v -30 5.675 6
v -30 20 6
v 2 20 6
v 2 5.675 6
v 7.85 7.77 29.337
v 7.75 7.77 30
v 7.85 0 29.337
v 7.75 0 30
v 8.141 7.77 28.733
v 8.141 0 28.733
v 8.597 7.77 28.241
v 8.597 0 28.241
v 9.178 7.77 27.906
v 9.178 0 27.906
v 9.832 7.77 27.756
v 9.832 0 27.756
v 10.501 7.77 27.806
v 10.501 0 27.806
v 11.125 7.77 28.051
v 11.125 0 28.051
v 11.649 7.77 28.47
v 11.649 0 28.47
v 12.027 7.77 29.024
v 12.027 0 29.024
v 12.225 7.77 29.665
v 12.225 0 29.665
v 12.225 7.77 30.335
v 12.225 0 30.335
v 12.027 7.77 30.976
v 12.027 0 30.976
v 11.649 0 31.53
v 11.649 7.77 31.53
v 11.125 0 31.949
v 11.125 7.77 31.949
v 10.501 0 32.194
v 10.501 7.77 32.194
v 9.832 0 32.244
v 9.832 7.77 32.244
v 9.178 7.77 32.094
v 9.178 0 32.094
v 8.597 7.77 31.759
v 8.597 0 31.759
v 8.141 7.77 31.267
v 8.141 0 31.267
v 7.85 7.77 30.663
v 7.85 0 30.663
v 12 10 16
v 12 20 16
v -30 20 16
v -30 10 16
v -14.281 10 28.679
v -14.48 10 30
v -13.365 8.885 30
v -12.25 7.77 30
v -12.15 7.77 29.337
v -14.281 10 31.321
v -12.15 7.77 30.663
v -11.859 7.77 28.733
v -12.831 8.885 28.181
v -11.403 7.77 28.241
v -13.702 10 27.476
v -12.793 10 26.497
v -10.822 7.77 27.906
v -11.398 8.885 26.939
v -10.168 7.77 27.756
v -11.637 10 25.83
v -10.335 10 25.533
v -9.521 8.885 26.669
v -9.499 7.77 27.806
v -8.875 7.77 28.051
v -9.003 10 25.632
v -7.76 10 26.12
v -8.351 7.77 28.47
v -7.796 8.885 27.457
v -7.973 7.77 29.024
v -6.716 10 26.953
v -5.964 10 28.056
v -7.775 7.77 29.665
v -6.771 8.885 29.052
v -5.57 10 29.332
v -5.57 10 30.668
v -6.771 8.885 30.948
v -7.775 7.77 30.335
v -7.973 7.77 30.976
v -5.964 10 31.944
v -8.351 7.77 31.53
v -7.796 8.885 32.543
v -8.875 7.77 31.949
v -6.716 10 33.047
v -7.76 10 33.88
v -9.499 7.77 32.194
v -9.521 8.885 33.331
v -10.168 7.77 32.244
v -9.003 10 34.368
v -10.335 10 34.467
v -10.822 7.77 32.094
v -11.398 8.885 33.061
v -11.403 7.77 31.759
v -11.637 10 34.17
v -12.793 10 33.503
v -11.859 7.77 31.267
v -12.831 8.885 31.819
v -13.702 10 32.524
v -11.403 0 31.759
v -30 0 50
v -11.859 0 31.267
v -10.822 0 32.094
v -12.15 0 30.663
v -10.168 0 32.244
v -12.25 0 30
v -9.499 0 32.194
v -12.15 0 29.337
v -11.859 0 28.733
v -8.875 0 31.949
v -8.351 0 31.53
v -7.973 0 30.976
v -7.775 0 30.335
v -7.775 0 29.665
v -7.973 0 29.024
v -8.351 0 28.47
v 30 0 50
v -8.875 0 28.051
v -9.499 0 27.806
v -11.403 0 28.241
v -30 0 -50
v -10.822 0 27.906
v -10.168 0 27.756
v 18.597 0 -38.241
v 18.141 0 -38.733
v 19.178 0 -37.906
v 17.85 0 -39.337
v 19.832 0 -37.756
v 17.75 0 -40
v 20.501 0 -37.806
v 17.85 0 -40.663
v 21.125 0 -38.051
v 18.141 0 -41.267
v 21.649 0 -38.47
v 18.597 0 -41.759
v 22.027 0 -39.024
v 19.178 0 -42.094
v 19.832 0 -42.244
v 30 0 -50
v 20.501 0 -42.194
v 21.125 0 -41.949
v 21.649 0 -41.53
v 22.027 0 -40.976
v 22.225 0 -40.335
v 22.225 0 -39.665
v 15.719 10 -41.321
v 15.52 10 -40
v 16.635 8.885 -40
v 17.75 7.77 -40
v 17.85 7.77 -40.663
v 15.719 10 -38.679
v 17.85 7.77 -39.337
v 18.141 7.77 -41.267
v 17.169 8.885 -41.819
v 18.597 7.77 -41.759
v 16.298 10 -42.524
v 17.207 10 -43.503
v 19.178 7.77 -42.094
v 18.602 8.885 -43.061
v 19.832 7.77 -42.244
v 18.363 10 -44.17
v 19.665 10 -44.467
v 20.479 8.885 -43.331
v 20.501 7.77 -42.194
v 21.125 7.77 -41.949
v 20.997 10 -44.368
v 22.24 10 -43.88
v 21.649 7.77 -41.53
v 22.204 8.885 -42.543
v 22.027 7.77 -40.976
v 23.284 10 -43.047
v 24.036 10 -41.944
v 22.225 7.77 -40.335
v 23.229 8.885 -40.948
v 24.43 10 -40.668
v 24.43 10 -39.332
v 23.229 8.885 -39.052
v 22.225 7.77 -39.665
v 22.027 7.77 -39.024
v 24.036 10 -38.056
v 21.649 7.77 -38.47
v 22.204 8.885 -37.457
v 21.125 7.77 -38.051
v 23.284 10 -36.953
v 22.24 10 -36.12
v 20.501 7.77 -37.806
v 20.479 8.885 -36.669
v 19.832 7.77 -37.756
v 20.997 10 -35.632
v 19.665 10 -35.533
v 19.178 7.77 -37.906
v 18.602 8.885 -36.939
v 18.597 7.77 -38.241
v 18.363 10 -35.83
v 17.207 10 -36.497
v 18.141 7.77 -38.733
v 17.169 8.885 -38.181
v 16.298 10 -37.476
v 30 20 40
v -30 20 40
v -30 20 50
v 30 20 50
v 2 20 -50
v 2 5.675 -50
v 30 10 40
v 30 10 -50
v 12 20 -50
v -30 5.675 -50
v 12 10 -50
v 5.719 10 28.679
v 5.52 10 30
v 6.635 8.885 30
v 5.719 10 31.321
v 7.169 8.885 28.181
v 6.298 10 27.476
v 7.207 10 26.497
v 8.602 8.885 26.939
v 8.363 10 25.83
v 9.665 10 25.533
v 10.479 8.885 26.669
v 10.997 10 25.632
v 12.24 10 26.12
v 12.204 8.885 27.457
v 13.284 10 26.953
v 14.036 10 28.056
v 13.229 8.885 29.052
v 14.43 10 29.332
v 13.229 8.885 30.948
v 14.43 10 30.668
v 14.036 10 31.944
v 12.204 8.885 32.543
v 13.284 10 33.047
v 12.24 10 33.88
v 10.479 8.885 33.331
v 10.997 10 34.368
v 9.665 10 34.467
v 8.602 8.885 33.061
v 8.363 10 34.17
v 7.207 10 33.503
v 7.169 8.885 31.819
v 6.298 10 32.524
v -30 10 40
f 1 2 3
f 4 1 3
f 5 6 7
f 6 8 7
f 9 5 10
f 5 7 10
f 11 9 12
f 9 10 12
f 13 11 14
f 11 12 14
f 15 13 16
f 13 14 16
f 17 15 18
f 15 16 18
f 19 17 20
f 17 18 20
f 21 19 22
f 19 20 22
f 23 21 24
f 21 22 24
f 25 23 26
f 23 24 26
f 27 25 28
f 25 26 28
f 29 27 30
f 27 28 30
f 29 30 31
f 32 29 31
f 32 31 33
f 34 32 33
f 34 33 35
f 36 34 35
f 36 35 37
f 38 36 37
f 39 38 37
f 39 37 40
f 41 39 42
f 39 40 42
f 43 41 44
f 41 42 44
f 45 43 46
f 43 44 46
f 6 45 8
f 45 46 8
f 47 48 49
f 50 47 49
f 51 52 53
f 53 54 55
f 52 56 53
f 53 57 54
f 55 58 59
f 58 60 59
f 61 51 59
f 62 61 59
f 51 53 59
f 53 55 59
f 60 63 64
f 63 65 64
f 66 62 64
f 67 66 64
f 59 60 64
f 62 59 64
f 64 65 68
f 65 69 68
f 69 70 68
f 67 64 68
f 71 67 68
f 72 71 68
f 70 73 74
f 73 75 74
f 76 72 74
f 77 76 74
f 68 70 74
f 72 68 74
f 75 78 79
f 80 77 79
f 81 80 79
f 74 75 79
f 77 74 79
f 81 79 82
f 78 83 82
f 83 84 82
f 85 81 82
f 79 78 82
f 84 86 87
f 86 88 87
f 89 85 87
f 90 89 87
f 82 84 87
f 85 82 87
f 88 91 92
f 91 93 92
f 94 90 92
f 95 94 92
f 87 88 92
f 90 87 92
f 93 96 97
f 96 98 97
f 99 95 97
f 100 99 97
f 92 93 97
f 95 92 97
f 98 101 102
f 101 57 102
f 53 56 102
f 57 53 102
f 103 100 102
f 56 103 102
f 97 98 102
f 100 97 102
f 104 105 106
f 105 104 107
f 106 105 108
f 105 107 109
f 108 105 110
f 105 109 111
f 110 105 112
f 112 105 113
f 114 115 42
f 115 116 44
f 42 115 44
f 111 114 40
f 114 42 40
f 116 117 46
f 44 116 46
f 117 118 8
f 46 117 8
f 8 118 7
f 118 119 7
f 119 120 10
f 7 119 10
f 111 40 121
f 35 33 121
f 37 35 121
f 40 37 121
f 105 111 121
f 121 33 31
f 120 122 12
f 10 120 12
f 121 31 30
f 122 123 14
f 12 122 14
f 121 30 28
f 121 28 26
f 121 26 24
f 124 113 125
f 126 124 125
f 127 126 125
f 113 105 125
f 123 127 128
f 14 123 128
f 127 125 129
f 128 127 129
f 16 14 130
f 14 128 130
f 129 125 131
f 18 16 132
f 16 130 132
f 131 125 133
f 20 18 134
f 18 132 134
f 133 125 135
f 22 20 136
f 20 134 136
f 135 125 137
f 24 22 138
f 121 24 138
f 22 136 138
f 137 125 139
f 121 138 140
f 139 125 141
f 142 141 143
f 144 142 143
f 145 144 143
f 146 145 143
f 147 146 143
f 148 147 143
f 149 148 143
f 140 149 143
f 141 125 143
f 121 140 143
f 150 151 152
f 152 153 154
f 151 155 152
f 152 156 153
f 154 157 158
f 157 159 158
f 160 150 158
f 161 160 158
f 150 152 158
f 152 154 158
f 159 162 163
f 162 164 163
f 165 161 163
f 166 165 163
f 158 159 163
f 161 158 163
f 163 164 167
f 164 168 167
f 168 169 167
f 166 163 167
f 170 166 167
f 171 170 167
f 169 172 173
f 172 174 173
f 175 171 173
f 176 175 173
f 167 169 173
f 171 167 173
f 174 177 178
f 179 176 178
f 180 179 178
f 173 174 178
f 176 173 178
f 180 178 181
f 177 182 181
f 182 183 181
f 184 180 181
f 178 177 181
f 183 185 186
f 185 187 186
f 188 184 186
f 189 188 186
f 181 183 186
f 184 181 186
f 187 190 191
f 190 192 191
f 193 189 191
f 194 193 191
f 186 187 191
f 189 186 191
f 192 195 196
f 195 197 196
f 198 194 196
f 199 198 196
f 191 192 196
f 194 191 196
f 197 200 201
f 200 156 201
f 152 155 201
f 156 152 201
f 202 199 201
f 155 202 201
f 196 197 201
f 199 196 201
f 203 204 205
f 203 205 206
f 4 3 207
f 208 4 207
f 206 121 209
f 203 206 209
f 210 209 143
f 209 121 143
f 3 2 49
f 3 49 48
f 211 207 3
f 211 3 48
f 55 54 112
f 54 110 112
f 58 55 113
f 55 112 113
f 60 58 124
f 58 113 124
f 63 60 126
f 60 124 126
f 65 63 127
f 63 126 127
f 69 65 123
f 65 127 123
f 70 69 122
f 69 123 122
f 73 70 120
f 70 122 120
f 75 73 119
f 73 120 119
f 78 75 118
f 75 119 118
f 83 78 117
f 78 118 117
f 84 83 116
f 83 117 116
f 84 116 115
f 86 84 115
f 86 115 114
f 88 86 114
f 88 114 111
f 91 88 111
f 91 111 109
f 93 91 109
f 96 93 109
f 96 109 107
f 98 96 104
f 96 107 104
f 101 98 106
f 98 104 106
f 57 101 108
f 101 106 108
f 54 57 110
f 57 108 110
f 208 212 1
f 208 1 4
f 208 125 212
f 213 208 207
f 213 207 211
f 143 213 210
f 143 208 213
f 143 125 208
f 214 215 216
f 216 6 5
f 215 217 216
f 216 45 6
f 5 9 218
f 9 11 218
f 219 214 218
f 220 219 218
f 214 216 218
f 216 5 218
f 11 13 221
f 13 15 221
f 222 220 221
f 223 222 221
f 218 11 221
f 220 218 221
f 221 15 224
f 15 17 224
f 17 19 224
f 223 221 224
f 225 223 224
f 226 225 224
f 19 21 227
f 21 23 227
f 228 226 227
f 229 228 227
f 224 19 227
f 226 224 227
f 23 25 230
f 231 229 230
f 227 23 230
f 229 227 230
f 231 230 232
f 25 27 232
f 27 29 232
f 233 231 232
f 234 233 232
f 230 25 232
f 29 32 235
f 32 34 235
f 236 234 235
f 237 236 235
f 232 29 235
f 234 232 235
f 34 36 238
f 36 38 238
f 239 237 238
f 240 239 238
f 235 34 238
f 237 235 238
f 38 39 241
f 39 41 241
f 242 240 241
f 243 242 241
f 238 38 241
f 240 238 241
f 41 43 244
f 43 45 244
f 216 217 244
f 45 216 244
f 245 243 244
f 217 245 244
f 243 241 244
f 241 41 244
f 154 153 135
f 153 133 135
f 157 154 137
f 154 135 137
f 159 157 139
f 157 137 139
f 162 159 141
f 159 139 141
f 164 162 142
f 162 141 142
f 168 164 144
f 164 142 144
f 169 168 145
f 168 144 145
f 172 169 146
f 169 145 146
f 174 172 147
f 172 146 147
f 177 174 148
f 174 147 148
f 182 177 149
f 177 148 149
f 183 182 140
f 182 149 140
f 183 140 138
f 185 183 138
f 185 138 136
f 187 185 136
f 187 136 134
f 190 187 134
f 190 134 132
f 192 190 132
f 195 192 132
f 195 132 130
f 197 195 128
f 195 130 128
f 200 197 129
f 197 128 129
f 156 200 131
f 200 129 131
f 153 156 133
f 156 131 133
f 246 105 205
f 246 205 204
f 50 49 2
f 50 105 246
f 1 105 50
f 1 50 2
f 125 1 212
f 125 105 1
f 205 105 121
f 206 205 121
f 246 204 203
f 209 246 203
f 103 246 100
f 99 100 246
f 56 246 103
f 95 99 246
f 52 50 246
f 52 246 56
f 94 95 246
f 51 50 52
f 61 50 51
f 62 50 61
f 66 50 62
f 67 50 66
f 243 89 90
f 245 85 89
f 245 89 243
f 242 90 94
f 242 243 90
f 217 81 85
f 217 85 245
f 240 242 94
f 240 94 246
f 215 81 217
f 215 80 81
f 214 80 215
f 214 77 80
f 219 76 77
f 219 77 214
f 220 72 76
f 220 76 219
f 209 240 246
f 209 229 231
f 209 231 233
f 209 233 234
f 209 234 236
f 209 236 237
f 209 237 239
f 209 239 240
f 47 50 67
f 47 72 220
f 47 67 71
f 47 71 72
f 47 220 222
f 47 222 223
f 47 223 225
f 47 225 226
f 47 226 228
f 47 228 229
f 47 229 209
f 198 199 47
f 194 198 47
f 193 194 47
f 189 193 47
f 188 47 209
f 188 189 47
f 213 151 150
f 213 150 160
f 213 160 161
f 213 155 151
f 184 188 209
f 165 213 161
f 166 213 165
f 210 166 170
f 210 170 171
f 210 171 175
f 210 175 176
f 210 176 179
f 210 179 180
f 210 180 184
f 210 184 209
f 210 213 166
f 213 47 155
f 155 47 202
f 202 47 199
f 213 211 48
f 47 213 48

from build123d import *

# Parameters (mm, degrees)
SKETCH1_W                     = 60
SKETCH1_H                     = 100
BOSS_EXTRUDE1_DEPTH           = 20
SKETCH2_W                     = 32
SKETCH2_H                     = 56
CUT_EXTRUDE1_DEPTH            = 14.325
CUT_EXTRUDE2_DEPTH            = 10
CSK_FOR_M4_SFHCS1_D           = 4.5
CSK_FOR_M4_SFHCS1_CSINK_D     = 8.96
CSK_FOR_M4_SFHCS1_CSINK_ANGLE = 90


with BuildPart() as part:
    # Sketch1 → Boss-Extrude1 (new body)
    with BuildSketch(Plane(origin=(0, 0, 0), x_dir=(1, 0, 0), z_dir=(0, 1, 0))):
        Rectangle(SKETCH1_W, SKETCH1_H)
    extrude(amount=BOSS_EXTRUDE1_DEPTH)

    # Sketch2 → Cut-Extrude1 (cut)
    with BuildSketch(Plane(origin=(0, 20, 0), x_dir=(1, 0, 0), z_dir=(0, 1, 0))):
        with Locations((-14, 22)):
            Rectangle(SKETCH2_W, SKETCH2_H)
    extrude(amount=-CUT_EXTRUDE1_DEPTH, mode=Mode.SUBTRACT)

    # Sketch3 → Cut-Extrude2 (cut)
    with BuildSketch(Plane(origin=(0, 20, 0), x_dir=(1, 0, 0), z_dir=(0, 1, 0))):
        Polygon((30, 50), (12, 50), (12, -16), (-30, -16), (-30, -40), (30, -40), align=None)
    extrude(amount=-CUT_EXTRUDE2_DEPTH, mode=Mode.SUBTRACT)

    # CSK for M4 SFHCS1 (through all)
    with Locations(Plane(origin=(0, 10, 0), x_dir=(1, 0, 0), z_dir=(0, 1, 0))):
        with Locations((20, 40), (10, -30), (-10, -30)):
            CounterSinkHole(CSK_FOR_M4_SFHCS1_D / 2, CSK_FOR_M4_SFHCS1_CSINK_D / 2, counter_sink_angle=CSK_FOR_M4_SFHCS1_CSINK_ANGLE)


solid = part.part
